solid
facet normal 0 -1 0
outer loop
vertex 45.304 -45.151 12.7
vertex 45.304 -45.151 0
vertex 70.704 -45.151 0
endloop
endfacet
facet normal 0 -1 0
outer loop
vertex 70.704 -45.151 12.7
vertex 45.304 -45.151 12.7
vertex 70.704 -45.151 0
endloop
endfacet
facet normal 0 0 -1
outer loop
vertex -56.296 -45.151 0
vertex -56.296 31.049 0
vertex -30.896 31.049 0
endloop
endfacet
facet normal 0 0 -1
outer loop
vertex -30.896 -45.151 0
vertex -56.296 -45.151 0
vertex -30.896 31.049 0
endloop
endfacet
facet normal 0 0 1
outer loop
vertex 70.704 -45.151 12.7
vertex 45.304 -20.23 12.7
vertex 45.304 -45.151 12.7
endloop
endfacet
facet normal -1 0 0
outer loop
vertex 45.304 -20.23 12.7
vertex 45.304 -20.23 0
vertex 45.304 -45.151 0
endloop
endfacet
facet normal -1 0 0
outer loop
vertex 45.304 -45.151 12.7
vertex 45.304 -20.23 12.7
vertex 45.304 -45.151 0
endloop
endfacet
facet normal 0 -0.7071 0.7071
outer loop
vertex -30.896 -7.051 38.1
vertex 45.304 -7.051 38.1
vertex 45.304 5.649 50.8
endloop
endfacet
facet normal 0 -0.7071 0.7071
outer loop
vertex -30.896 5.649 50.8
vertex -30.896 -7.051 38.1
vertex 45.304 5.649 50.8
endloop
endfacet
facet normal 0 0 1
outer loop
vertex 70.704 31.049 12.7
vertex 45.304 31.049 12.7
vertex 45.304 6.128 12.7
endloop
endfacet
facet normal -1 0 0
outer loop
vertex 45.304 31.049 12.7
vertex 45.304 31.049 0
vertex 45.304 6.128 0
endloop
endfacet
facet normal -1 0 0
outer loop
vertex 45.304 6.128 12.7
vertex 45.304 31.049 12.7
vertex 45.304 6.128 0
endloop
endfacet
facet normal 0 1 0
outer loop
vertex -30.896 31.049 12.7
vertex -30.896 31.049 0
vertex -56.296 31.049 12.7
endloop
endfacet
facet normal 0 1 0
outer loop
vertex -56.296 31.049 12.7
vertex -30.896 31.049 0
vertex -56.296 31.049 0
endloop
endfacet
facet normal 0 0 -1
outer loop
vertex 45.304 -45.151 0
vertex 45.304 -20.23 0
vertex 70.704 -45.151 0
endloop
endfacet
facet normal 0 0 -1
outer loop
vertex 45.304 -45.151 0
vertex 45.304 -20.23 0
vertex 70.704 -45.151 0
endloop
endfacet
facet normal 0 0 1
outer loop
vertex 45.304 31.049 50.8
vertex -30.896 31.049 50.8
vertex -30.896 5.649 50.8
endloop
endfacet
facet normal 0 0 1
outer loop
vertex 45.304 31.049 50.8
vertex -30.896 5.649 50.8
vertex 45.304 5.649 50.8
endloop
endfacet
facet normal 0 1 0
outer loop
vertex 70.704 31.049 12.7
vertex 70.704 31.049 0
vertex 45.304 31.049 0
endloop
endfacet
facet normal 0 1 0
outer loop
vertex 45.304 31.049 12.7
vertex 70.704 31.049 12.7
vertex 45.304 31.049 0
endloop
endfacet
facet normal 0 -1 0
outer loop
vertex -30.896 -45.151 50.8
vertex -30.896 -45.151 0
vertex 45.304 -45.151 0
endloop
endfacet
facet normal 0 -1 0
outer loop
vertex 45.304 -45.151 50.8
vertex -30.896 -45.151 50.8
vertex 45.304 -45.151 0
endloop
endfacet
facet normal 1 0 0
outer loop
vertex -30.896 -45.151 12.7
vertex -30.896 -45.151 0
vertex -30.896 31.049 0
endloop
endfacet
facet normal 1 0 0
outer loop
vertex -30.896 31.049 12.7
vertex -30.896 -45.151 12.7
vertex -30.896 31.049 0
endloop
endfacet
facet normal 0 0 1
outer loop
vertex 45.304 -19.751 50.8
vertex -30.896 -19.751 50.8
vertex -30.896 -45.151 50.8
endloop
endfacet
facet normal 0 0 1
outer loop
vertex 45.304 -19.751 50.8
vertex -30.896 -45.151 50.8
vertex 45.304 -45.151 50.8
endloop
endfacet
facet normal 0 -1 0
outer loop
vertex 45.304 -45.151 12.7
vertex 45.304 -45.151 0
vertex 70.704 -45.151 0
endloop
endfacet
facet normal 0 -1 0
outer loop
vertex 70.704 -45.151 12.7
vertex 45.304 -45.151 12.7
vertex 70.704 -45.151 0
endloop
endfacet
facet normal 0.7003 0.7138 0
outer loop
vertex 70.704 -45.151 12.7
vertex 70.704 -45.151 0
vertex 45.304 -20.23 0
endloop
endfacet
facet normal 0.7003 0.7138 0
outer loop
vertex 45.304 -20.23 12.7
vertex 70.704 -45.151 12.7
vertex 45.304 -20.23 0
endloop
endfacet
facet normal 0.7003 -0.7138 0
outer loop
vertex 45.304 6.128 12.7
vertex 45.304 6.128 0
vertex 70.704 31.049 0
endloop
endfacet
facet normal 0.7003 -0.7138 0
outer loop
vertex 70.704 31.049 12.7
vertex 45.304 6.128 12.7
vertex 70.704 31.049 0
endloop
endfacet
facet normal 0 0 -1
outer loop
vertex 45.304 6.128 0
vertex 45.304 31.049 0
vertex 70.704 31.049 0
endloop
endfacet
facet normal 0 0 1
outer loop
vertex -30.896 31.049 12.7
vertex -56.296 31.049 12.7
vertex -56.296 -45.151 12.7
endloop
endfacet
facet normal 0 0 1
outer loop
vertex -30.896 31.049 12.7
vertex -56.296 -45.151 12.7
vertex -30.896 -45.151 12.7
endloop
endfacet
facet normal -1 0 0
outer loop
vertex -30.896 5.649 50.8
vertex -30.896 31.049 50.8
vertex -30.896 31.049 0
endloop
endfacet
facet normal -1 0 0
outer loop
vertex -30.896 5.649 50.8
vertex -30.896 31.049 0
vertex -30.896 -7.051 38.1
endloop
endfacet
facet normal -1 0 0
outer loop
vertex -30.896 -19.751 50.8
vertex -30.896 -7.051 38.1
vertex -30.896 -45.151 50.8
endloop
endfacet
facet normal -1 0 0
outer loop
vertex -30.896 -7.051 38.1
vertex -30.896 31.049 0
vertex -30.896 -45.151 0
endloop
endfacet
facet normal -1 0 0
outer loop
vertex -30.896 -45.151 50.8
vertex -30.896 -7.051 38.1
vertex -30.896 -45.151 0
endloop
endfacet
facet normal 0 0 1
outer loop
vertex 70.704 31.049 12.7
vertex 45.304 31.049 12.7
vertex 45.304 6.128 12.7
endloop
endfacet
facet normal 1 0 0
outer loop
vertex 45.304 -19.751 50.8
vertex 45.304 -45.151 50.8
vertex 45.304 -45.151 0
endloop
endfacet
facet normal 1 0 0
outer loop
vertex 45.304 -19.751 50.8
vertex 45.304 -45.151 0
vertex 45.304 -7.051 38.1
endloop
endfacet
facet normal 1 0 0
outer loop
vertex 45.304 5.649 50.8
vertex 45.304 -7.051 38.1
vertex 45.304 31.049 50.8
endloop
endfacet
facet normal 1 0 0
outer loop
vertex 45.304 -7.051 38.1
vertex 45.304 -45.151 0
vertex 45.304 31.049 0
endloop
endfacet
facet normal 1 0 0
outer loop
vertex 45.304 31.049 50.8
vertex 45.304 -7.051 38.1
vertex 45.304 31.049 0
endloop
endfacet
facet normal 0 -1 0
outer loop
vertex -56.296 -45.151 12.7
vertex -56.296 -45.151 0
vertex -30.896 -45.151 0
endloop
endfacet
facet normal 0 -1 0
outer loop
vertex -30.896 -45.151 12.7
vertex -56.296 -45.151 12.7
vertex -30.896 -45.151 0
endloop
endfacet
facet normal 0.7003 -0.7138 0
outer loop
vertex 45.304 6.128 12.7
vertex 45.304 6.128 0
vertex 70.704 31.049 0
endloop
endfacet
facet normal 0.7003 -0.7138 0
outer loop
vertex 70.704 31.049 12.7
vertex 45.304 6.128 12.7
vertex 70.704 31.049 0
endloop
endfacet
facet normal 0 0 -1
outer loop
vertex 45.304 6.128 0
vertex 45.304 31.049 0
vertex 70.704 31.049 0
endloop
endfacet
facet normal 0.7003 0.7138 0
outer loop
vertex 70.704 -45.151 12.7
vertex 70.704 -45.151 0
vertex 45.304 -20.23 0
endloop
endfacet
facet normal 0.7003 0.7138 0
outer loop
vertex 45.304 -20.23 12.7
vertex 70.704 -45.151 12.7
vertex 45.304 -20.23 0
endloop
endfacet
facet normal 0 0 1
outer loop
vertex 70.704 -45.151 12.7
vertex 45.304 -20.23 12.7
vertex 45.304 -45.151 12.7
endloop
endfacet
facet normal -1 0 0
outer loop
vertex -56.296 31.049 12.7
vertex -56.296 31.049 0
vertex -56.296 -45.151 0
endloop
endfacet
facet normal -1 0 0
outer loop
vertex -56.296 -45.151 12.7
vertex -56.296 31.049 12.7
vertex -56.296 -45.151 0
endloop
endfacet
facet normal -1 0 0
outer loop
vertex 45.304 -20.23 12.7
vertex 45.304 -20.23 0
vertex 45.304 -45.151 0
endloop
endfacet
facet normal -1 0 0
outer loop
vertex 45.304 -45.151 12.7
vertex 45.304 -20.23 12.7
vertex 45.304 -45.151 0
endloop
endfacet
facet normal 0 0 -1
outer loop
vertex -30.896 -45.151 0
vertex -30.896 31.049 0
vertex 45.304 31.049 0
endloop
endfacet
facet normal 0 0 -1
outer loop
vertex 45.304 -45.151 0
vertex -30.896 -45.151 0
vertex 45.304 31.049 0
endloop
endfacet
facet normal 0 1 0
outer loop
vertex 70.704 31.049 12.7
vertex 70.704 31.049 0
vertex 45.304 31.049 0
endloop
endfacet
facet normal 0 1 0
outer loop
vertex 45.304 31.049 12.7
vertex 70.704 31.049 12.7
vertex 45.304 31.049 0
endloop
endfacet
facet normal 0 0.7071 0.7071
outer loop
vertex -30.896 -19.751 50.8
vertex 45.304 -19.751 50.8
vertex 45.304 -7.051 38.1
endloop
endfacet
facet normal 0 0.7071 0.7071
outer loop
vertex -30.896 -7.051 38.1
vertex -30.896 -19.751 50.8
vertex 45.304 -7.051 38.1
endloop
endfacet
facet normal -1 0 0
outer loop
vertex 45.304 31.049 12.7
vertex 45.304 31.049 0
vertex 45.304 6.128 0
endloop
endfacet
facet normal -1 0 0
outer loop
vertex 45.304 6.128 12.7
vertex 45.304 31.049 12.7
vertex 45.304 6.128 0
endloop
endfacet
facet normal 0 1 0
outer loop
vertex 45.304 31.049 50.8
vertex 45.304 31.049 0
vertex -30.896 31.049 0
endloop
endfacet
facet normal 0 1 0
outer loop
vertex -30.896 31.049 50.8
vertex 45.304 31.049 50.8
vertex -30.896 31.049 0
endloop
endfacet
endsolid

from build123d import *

# Parameters (mm, degrees)
F1_DEPTH = 12.7
F2_DEPTH = 12.7
F3_DEPTH = 50.8
F5_DEPTH = 101.601


with BuildPart() as f1:
    # F0 (on Top) → F1 (new body)
    with BuildSketch(Plane.XY):
        Polygon((70.704034, -45.151241), (45.304034, -20.230069), (45.304034, -45.151241), align=None)
        Polygon((70.704034, 31.048759), (45.304034, 31.048759), (45.304034, 6.127586), align=None)
    extrude(amount=F1_DEPTH)


with BuildPart() as f2:
    # F0 (on Top) → F2 (new body)
    with BuildSketch(Plane.XY):
        Polygon((70.704034, -45.151241), (45.304034, -20.230069), (45.304034, -45.151241), align=None)
        Polygon((70.704034, 31.048759), (45.304034, 31.048759), (45.304034, 6.127586), align=None)
        Polygon((-30.895966, 6.127586), (-30.895966, 31.048759), (-56.295966, 31.048759), (-56.295966, -45.151241), (-30.895966, -45.151241), (-30.895966, -20.230069), align=None)
    extrude(amount=F2_DEPTH)


with BuildPart() as f3:
    # F0 (on Top) → F3 (new body)
    with BuildSketch(Plane.XY):
        Polygon((45.304034, 31.048759), (-30.895966, 31.048759), (-30.895966, 6.127586), (-30.895966, -20.230069), (-30.895966, -45.151241), (45.304034, -45.151241), (45.304034, -20.230069), (45.304034, 6.127586), align=None)
    extrude(amount=F3_DEPTH)

    # F4 (on face) → F5 (cut, through all)
    with BuildSketch(Plane.YZ.offset(45.304034)):
        Polygon((5.648759, 50.8), (-19.751241, 50.8), (-7.051241, 38.1), align=None)
    extrude(amount=-F5_DEPTH, mode=Mode.SUBTRACT)


solid = Compound([f1.part, f2.part, f3.part])
